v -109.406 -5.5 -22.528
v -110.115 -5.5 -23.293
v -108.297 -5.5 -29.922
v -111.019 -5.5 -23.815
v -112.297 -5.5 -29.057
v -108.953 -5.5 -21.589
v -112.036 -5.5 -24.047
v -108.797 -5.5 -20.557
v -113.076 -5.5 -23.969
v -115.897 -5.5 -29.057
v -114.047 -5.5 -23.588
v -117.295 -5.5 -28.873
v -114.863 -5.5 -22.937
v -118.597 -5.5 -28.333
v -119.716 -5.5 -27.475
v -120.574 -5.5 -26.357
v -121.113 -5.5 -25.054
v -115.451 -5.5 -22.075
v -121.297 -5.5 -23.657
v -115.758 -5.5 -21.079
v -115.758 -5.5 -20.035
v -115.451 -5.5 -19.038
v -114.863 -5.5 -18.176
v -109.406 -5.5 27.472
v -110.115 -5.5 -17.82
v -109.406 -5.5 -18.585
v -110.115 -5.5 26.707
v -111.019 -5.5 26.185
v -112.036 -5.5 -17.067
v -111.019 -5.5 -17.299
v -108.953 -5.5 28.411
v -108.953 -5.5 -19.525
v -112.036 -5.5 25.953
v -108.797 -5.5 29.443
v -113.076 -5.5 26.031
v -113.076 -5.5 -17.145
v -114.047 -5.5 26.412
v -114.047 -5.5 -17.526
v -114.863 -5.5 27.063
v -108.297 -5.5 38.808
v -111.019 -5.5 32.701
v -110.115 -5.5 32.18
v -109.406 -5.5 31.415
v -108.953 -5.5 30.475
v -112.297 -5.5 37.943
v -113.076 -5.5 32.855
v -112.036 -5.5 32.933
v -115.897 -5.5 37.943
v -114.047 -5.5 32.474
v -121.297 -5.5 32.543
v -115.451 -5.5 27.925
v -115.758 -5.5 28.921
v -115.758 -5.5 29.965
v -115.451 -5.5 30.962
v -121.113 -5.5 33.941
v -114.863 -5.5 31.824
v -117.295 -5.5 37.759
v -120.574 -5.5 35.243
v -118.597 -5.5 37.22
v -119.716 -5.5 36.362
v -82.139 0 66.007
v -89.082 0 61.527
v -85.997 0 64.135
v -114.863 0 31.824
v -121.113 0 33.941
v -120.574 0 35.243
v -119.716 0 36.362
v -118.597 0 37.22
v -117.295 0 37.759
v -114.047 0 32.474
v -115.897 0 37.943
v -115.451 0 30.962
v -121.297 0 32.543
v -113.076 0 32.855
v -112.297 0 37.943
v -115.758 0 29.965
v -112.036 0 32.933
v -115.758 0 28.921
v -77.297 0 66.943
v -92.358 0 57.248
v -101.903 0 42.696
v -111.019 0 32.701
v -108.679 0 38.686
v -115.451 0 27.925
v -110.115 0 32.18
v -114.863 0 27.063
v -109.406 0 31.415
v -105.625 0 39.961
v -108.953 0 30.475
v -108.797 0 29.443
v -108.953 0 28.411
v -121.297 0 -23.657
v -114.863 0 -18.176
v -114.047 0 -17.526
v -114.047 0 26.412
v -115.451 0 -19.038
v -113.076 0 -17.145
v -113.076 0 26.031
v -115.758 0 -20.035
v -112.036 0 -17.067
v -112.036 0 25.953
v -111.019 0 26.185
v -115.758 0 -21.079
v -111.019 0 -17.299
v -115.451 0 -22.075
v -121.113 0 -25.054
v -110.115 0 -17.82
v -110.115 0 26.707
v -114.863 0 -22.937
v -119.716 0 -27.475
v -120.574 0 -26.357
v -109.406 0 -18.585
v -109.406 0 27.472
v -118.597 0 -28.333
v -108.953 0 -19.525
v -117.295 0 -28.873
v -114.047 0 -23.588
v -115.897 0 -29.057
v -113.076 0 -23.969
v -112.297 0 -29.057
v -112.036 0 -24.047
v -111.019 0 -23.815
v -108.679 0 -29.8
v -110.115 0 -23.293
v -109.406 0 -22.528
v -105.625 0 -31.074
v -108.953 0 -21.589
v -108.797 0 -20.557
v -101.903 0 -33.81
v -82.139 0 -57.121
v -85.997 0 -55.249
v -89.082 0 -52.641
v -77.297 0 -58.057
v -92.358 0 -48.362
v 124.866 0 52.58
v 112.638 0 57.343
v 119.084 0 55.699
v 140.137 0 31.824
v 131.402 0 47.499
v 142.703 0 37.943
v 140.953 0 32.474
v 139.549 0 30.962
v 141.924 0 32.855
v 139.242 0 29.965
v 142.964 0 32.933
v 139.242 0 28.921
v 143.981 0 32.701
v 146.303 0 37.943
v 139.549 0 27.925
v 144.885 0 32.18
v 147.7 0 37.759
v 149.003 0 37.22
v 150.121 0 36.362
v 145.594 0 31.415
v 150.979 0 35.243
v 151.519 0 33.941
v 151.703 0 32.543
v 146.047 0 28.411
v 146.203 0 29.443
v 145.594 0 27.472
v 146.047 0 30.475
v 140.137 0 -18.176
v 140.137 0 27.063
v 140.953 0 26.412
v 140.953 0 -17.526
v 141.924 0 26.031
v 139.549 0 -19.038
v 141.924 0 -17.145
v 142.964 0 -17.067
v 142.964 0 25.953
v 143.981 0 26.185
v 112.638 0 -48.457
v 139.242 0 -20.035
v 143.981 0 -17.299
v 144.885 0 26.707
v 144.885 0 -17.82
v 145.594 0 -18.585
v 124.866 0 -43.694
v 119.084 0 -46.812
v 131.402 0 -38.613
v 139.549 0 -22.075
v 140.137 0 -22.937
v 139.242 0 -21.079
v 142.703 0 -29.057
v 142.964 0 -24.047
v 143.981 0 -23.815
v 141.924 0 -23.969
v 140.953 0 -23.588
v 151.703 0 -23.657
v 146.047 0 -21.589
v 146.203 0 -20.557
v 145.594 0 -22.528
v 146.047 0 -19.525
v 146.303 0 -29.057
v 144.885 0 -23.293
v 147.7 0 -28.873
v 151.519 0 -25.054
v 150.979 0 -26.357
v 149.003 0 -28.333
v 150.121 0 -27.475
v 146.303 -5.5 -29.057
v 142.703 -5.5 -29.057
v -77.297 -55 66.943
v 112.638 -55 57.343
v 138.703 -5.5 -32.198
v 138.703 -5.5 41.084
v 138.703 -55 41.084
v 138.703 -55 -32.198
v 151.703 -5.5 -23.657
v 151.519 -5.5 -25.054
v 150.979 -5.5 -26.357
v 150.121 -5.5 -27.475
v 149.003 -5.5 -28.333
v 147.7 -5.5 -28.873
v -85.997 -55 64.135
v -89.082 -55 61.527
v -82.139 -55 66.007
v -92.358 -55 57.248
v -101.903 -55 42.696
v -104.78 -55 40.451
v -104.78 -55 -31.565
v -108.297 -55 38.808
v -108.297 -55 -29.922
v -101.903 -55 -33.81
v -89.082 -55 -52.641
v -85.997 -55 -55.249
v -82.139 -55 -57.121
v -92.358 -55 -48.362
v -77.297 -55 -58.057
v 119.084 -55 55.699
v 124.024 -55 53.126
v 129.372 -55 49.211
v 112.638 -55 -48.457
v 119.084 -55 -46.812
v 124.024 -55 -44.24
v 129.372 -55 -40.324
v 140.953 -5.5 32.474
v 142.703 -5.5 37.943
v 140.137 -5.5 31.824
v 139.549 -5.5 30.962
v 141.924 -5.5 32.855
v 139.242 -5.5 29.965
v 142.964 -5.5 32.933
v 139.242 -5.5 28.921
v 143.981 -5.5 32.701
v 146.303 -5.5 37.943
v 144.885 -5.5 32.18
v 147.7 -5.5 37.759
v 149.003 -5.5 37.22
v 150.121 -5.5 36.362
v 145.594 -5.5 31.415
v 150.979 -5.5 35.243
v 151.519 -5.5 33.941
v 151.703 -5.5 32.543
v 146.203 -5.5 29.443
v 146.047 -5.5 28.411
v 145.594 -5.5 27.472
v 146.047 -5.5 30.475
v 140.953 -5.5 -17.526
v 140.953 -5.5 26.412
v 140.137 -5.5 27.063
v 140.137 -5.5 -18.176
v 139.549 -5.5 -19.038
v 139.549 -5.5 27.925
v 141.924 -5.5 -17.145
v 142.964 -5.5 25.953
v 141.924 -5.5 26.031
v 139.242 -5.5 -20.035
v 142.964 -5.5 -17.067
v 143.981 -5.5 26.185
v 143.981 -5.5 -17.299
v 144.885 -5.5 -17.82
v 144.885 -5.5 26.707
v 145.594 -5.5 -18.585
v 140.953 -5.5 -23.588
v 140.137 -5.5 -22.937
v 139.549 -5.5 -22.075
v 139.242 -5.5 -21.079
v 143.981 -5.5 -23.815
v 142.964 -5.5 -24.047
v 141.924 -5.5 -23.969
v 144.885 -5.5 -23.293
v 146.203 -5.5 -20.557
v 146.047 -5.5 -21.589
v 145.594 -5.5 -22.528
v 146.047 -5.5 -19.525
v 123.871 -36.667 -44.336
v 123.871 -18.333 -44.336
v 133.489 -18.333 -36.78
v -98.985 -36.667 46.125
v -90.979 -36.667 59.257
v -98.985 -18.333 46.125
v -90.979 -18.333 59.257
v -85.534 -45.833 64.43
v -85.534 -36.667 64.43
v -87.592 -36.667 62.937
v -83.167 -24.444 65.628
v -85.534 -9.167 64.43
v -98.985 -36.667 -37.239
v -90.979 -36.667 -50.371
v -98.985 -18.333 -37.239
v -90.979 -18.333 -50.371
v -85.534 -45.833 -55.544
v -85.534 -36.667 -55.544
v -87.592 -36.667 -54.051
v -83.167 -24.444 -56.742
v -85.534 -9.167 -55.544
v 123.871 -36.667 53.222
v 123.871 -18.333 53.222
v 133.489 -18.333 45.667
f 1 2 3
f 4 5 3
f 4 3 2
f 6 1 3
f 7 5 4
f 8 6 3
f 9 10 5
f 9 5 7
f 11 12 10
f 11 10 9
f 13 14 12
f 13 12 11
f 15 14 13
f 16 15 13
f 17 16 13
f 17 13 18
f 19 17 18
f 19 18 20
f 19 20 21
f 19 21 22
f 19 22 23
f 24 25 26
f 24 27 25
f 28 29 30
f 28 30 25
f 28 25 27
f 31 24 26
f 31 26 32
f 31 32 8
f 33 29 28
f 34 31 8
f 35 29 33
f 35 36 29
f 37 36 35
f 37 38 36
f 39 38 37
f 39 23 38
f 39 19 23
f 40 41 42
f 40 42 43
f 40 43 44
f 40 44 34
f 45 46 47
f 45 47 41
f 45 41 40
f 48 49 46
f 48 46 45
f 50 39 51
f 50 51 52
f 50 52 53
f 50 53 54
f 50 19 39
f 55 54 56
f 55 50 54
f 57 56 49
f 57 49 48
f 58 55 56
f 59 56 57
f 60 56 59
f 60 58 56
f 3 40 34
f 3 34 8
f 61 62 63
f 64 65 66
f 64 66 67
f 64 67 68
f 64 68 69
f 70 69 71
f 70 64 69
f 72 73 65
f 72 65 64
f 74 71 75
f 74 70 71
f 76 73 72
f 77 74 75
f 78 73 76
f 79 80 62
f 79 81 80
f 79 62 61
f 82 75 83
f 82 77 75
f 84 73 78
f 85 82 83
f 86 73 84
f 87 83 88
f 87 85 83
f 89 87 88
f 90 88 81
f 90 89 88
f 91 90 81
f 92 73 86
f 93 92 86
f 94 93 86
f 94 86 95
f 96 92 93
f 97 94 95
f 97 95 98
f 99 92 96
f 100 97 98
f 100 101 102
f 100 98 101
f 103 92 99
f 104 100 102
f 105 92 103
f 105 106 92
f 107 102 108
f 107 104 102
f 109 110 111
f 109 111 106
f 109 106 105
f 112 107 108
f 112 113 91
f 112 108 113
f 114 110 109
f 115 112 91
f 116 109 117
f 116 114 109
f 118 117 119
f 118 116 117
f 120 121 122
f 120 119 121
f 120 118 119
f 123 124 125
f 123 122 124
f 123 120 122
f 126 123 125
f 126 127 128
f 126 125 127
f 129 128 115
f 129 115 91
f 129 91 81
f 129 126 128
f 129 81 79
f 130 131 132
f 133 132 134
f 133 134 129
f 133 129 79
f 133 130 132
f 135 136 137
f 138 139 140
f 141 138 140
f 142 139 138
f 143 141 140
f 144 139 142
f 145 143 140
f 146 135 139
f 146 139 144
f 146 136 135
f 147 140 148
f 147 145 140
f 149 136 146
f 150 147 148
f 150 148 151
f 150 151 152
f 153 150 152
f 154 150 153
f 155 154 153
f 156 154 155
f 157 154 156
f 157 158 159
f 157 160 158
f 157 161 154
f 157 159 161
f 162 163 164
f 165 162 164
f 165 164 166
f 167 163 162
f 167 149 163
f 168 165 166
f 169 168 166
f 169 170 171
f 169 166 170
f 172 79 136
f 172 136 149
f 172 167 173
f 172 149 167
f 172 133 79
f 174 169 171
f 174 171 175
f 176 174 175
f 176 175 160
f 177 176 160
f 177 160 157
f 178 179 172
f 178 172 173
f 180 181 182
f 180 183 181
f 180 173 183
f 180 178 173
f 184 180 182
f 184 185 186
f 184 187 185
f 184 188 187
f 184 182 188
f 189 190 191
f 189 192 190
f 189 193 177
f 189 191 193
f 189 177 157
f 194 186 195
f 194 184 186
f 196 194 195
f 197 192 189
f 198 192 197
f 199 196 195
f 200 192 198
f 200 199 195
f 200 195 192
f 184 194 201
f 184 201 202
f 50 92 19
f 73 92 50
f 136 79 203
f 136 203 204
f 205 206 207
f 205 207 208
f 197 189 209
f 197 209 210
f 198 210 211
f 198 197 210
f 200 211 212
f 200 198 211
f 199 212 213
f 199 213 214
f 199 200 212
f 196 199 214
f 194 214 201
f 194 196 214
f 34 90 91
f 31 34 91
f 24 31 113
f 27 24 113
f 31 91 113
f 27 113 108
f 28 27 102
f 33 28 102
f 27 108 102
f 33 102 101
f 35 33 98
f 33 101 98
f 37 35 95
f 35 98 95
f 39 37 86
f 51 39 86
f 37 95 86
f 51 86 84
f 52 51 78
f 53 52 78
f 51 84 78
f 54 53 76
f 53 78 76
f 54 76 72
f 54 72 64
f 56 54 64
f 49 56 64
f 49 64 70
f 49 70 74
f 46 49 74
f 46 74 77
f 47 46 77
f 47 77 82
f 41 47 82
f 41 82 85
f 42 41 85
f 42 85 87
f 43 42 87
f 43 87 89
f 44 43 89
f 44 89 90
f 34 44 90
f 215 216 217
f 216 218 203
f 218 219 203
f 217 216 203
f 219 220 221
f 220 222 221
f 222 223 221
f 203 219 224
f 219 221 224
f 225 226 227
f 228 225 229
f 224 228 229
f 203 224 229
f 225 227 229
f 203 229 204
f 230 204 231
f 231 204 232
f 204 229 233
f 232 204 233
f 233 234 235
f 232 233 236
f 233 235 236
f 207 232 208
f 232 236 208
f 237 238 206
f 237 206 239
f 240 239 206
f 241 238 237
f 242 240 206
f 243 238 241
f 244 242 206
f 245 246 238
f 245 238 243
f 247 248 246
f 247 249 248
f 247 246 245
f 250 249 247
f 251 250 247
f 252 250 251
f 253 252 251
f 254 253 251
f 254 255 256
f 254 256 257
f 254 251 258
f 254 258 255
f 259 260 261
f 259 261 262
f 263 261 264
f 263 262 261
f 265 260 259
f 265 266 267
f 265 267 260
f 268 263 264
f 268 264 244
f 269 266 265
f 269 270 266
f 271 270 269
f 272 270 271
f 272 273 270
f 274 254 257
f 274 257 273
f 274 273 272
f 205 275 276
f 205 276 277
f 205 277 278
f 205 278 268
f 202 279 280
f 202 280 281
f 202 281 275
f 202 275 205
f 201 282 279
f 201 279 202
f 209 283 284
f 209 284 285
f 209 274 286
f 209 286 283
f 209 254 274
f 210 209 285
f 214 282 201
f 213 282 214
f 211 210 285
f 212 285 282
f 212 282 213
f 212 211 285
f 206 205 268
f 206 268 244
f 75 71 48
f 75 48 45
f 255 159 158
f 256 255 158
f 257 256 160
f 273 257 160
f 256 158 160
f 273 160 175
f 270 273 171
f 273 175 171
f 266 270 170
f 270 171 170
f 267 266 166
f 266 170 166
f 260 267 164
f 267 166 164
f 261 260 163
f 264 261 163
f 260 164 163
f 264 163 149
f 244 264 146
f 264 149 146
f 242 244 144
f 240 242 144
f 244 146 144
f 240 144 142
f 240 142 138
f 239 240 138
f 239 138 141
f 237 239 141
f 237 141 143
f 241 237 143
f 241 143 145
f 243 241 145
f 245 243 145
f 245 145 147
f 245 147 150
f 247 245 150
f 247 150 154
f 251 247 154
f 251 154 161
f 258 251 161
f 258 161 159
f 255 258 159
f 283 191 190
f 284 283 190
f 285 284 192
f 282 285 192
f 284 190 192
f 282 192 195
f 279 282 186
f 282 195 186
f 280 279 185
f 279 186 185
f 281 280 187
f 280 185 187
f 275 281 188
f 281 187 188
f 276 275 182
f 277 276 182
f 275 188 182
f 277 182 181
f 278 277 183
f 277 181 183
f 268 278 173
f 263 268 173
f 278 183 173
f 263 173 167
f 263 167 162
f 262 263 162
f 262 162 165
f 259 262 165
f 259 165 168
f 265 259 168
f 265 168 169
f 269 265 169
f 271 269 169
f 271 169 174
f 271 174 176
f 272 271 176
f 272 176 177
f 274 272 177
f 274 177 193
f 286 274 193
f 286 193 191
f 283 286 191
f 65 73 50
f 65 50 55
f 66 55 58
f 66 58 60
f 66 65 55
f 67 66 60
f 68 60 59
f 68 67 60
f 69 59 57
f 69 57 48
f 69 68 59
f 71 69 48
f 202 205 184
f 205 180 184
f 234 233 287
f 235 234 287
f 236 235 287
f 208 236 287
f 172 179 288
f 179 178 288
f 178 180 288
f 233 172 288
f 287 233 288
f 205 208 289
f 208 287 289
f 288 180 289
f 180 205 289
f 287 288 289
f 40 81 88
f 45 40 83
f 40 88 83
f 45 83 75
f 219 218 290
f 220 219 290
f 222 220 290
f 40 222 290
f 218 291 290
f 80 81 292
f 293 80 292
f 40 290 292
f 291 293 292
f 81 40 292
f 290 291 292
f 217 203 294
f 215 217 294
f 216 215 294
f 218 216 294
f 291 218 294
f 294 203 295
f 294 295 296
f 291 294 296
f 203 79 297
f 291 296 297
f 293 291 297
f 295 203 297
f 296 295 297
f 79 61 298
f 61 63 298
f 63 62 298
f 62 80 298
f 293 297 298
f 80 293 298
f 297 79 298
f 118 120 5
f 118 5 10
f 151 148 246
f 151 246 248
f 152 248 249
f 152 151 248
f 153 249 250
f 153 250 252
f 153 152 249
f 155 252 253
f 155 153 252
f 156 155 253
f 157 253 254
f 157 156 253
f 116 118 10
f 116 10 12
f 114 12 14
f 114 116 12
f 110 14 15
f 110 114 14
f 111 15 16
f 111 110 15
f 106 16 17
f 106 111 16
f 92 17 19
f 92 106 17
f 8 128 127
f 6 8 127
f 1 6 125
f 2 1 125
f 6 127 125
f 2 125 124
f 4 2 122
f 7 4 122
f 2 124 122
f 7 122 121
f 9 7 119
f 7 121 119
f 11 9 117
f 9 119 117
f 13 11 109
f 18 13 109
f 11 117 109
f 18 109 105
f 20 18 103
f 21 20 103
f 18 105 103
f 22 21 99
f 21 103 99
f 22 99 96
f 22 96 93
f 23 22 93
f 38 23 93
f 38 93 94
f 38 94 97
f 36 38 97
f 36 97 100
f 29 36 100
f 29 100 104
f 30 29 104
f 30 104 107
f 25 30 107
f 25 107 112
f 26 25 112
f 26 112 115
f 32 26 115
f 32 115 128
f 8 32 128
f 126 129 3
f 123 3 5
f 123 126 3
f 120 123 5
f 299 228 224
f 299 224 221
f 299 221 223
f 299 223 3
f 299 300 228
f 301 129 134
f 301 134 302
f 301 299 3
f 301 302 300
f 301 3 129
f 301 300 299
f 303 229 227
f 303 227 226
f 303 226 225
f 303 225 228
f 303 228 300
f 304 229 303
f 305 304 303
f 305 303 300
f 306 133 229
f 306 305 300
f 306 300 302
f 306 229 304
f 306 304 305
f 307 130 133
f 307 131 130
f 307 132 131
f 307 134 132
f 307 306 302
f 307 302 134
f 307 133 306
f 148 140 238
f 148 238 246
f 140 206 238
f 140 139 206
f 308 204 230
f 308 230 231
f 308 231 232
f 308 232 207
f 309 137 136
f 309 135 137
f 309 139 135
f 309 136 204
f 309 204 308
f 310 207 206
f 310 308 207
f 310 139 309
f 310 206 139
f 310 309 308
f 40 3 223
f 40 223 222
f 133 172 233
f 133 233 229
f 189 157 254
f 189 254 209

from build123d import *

# Parameters (mm, degrees)
SKETCH1_R           = 3.5
BOSS_EXTRUDE2_DEPTH = 55
SKETCH7_W           = 68.999652055
SKETCH7_H           = 50.415620377
CUT_EXTRUDE5_DEPTH  = 13
SKETCH19_W          = 74.859412742
SKETCH19_H          = 60.725118028
CUT_EXTRUDE7_DEPTH  = 13


with BuildPart() as part:
    # Sketch1 → Boss-Extrude2 (new body)
    with BuildSketch(Plane(origin=(0, 0, 0), x_dir=(1, 0, 0), z_dir=(0, 1, 0))):
        with BuildLine():
            Line((-77.297393365, -66.943127962), (112.637979465, -57.343127962))
            add(Edge.make_bspline(
                [(112.637979465, -57.343127962), (125.082628436, -56.027724614), (133.287763268, -44.662014668), (142.702606635, -37.943127962)],
                knots=[0, 0, 0, 0, 1, 1, 1, 1], degree=3))
            Line((142.702606635, -37.943127962), (146.202606635, -37.943127962))
            Line((146.202606635, -37.943127962), (146.302606635, -37.943127962))
            ThreePointArc((146.302606635, -37.943127962), (150.120983253, -36.36150458), (151.702606635, -32.543127962))
            Line((151.702606635, -32.543127962), (151.702606635, 23.656872038))
            ThreePointArc((151.702606635, 23.656872038), (150.120983253, 27.475248656), (146.302606635, 29.056872038))
            Line((146.302606635, 29.056872038), (146.202606635, 29.056872038))
            Line((146.202606635, 29.056872038), (142.702606635, 29.056872038))
            add(Edge.make_bspline(
                [(112.637979465, 48.456872038), (125.082628436, 47.14146869), (133.287763268, 35.775758744), (142.702606635, 29.056872038)],
                knots=[0, 0, 0, 0, 1, 1, 1, 1], degree=3))
            Line((112.637979465, 48.456872038), (-77.297393365, 58.056872038))
            add(Edge.make_bspline(
                [(-77.297393365, 58.056872038), (-97.47829568, 56.558543187), (-92.669908534, 31.299380259), (-112.297393365, 29.056872038)],
                knots=[0, 0, 0, 0, 1, 1, 1, 1], degree=3))
            Line((-112.297393365, 29.056872038), (-115.797393365, 29.056872038))
            Line((-115.797393365, 29.056872038), (-115.897393365, 29.056872038))
            ThreePointArc((-115.897393365, 29.056872038), (-119.715769983, 27.475248656), (-121.297393365, 23.656872038))
            Line((-121.297393365, 23.656872038), (-121.297393365, -32.543127962))
            ThreePointArc((-121.297393365, -32.543127962), (-119.715769983, -36.36150458), (-115.897393365, -37.943127962))
            Line((-115.897393365, -37.943127962), (-115.797393365, -37.943127962))
            Line((-115.797393365, -37.943127962), (-112.297393365, -37.943127962))
            add(Edge.make_bspline(
                [(-77.297393365, -66.943127962), (-97.47829568, -65.444799111), (-92.669908534, -40.185636183), (-112.297393365, -37.943127962)],
                knots=[0, 0, 0, 0, 1, 1, 1, 1], degree=3))
        make_face()
        with Locations((-112.297393365, 20.556872038)):
            Circle(SKETCH1_R, mode=Mode.SUBTRACT)
        with Locations((-112.297393365, -29.443127962)):
            Circle(SKETCH1_R, mode=Mode.SUBTRACT)
        with Locations((142.702606635, -29.443127962)):
            Circle(SKETCH1_R, mode=Mode.SUBTRACT)
        with Locations((142.702606635, 20.556872038)):
            Circle(SKETCH1_R, mode=Mode.SUBTRACT)
    extrude(amount=-BOSS_EXTRUDE2_DEPTH)

    # Sketch7 → Cut-Extrude5 (cut)
    with BuildSketch(Plane.ZY.offset(121.297393365)):
        with Locations((4.333112833, -30.707810189)):
            Rectangle(SKETCH7_W, SKETCH7_H)
    extrude(amount=-CUT_EXTRUDE5_DEPTH, mode=Mode.SUBTRACT)

    # Sketch19 → Cut-Extrude7 (cut)
    with BuildSketch(Plane(origin=(151.702606635, 0, 0), x_dir=(0, 0, -1), z_dir=(1, 0, 0))):
        with Locations((-5.097493458, -35.862559014)):
            Rectangle(SKETCH19_W, SKETCH19_H)
    extrude(amount=-CUT_EXTRUDE7_DEPTH, mode=Mode.SUBTRACT)


solid = part.part
